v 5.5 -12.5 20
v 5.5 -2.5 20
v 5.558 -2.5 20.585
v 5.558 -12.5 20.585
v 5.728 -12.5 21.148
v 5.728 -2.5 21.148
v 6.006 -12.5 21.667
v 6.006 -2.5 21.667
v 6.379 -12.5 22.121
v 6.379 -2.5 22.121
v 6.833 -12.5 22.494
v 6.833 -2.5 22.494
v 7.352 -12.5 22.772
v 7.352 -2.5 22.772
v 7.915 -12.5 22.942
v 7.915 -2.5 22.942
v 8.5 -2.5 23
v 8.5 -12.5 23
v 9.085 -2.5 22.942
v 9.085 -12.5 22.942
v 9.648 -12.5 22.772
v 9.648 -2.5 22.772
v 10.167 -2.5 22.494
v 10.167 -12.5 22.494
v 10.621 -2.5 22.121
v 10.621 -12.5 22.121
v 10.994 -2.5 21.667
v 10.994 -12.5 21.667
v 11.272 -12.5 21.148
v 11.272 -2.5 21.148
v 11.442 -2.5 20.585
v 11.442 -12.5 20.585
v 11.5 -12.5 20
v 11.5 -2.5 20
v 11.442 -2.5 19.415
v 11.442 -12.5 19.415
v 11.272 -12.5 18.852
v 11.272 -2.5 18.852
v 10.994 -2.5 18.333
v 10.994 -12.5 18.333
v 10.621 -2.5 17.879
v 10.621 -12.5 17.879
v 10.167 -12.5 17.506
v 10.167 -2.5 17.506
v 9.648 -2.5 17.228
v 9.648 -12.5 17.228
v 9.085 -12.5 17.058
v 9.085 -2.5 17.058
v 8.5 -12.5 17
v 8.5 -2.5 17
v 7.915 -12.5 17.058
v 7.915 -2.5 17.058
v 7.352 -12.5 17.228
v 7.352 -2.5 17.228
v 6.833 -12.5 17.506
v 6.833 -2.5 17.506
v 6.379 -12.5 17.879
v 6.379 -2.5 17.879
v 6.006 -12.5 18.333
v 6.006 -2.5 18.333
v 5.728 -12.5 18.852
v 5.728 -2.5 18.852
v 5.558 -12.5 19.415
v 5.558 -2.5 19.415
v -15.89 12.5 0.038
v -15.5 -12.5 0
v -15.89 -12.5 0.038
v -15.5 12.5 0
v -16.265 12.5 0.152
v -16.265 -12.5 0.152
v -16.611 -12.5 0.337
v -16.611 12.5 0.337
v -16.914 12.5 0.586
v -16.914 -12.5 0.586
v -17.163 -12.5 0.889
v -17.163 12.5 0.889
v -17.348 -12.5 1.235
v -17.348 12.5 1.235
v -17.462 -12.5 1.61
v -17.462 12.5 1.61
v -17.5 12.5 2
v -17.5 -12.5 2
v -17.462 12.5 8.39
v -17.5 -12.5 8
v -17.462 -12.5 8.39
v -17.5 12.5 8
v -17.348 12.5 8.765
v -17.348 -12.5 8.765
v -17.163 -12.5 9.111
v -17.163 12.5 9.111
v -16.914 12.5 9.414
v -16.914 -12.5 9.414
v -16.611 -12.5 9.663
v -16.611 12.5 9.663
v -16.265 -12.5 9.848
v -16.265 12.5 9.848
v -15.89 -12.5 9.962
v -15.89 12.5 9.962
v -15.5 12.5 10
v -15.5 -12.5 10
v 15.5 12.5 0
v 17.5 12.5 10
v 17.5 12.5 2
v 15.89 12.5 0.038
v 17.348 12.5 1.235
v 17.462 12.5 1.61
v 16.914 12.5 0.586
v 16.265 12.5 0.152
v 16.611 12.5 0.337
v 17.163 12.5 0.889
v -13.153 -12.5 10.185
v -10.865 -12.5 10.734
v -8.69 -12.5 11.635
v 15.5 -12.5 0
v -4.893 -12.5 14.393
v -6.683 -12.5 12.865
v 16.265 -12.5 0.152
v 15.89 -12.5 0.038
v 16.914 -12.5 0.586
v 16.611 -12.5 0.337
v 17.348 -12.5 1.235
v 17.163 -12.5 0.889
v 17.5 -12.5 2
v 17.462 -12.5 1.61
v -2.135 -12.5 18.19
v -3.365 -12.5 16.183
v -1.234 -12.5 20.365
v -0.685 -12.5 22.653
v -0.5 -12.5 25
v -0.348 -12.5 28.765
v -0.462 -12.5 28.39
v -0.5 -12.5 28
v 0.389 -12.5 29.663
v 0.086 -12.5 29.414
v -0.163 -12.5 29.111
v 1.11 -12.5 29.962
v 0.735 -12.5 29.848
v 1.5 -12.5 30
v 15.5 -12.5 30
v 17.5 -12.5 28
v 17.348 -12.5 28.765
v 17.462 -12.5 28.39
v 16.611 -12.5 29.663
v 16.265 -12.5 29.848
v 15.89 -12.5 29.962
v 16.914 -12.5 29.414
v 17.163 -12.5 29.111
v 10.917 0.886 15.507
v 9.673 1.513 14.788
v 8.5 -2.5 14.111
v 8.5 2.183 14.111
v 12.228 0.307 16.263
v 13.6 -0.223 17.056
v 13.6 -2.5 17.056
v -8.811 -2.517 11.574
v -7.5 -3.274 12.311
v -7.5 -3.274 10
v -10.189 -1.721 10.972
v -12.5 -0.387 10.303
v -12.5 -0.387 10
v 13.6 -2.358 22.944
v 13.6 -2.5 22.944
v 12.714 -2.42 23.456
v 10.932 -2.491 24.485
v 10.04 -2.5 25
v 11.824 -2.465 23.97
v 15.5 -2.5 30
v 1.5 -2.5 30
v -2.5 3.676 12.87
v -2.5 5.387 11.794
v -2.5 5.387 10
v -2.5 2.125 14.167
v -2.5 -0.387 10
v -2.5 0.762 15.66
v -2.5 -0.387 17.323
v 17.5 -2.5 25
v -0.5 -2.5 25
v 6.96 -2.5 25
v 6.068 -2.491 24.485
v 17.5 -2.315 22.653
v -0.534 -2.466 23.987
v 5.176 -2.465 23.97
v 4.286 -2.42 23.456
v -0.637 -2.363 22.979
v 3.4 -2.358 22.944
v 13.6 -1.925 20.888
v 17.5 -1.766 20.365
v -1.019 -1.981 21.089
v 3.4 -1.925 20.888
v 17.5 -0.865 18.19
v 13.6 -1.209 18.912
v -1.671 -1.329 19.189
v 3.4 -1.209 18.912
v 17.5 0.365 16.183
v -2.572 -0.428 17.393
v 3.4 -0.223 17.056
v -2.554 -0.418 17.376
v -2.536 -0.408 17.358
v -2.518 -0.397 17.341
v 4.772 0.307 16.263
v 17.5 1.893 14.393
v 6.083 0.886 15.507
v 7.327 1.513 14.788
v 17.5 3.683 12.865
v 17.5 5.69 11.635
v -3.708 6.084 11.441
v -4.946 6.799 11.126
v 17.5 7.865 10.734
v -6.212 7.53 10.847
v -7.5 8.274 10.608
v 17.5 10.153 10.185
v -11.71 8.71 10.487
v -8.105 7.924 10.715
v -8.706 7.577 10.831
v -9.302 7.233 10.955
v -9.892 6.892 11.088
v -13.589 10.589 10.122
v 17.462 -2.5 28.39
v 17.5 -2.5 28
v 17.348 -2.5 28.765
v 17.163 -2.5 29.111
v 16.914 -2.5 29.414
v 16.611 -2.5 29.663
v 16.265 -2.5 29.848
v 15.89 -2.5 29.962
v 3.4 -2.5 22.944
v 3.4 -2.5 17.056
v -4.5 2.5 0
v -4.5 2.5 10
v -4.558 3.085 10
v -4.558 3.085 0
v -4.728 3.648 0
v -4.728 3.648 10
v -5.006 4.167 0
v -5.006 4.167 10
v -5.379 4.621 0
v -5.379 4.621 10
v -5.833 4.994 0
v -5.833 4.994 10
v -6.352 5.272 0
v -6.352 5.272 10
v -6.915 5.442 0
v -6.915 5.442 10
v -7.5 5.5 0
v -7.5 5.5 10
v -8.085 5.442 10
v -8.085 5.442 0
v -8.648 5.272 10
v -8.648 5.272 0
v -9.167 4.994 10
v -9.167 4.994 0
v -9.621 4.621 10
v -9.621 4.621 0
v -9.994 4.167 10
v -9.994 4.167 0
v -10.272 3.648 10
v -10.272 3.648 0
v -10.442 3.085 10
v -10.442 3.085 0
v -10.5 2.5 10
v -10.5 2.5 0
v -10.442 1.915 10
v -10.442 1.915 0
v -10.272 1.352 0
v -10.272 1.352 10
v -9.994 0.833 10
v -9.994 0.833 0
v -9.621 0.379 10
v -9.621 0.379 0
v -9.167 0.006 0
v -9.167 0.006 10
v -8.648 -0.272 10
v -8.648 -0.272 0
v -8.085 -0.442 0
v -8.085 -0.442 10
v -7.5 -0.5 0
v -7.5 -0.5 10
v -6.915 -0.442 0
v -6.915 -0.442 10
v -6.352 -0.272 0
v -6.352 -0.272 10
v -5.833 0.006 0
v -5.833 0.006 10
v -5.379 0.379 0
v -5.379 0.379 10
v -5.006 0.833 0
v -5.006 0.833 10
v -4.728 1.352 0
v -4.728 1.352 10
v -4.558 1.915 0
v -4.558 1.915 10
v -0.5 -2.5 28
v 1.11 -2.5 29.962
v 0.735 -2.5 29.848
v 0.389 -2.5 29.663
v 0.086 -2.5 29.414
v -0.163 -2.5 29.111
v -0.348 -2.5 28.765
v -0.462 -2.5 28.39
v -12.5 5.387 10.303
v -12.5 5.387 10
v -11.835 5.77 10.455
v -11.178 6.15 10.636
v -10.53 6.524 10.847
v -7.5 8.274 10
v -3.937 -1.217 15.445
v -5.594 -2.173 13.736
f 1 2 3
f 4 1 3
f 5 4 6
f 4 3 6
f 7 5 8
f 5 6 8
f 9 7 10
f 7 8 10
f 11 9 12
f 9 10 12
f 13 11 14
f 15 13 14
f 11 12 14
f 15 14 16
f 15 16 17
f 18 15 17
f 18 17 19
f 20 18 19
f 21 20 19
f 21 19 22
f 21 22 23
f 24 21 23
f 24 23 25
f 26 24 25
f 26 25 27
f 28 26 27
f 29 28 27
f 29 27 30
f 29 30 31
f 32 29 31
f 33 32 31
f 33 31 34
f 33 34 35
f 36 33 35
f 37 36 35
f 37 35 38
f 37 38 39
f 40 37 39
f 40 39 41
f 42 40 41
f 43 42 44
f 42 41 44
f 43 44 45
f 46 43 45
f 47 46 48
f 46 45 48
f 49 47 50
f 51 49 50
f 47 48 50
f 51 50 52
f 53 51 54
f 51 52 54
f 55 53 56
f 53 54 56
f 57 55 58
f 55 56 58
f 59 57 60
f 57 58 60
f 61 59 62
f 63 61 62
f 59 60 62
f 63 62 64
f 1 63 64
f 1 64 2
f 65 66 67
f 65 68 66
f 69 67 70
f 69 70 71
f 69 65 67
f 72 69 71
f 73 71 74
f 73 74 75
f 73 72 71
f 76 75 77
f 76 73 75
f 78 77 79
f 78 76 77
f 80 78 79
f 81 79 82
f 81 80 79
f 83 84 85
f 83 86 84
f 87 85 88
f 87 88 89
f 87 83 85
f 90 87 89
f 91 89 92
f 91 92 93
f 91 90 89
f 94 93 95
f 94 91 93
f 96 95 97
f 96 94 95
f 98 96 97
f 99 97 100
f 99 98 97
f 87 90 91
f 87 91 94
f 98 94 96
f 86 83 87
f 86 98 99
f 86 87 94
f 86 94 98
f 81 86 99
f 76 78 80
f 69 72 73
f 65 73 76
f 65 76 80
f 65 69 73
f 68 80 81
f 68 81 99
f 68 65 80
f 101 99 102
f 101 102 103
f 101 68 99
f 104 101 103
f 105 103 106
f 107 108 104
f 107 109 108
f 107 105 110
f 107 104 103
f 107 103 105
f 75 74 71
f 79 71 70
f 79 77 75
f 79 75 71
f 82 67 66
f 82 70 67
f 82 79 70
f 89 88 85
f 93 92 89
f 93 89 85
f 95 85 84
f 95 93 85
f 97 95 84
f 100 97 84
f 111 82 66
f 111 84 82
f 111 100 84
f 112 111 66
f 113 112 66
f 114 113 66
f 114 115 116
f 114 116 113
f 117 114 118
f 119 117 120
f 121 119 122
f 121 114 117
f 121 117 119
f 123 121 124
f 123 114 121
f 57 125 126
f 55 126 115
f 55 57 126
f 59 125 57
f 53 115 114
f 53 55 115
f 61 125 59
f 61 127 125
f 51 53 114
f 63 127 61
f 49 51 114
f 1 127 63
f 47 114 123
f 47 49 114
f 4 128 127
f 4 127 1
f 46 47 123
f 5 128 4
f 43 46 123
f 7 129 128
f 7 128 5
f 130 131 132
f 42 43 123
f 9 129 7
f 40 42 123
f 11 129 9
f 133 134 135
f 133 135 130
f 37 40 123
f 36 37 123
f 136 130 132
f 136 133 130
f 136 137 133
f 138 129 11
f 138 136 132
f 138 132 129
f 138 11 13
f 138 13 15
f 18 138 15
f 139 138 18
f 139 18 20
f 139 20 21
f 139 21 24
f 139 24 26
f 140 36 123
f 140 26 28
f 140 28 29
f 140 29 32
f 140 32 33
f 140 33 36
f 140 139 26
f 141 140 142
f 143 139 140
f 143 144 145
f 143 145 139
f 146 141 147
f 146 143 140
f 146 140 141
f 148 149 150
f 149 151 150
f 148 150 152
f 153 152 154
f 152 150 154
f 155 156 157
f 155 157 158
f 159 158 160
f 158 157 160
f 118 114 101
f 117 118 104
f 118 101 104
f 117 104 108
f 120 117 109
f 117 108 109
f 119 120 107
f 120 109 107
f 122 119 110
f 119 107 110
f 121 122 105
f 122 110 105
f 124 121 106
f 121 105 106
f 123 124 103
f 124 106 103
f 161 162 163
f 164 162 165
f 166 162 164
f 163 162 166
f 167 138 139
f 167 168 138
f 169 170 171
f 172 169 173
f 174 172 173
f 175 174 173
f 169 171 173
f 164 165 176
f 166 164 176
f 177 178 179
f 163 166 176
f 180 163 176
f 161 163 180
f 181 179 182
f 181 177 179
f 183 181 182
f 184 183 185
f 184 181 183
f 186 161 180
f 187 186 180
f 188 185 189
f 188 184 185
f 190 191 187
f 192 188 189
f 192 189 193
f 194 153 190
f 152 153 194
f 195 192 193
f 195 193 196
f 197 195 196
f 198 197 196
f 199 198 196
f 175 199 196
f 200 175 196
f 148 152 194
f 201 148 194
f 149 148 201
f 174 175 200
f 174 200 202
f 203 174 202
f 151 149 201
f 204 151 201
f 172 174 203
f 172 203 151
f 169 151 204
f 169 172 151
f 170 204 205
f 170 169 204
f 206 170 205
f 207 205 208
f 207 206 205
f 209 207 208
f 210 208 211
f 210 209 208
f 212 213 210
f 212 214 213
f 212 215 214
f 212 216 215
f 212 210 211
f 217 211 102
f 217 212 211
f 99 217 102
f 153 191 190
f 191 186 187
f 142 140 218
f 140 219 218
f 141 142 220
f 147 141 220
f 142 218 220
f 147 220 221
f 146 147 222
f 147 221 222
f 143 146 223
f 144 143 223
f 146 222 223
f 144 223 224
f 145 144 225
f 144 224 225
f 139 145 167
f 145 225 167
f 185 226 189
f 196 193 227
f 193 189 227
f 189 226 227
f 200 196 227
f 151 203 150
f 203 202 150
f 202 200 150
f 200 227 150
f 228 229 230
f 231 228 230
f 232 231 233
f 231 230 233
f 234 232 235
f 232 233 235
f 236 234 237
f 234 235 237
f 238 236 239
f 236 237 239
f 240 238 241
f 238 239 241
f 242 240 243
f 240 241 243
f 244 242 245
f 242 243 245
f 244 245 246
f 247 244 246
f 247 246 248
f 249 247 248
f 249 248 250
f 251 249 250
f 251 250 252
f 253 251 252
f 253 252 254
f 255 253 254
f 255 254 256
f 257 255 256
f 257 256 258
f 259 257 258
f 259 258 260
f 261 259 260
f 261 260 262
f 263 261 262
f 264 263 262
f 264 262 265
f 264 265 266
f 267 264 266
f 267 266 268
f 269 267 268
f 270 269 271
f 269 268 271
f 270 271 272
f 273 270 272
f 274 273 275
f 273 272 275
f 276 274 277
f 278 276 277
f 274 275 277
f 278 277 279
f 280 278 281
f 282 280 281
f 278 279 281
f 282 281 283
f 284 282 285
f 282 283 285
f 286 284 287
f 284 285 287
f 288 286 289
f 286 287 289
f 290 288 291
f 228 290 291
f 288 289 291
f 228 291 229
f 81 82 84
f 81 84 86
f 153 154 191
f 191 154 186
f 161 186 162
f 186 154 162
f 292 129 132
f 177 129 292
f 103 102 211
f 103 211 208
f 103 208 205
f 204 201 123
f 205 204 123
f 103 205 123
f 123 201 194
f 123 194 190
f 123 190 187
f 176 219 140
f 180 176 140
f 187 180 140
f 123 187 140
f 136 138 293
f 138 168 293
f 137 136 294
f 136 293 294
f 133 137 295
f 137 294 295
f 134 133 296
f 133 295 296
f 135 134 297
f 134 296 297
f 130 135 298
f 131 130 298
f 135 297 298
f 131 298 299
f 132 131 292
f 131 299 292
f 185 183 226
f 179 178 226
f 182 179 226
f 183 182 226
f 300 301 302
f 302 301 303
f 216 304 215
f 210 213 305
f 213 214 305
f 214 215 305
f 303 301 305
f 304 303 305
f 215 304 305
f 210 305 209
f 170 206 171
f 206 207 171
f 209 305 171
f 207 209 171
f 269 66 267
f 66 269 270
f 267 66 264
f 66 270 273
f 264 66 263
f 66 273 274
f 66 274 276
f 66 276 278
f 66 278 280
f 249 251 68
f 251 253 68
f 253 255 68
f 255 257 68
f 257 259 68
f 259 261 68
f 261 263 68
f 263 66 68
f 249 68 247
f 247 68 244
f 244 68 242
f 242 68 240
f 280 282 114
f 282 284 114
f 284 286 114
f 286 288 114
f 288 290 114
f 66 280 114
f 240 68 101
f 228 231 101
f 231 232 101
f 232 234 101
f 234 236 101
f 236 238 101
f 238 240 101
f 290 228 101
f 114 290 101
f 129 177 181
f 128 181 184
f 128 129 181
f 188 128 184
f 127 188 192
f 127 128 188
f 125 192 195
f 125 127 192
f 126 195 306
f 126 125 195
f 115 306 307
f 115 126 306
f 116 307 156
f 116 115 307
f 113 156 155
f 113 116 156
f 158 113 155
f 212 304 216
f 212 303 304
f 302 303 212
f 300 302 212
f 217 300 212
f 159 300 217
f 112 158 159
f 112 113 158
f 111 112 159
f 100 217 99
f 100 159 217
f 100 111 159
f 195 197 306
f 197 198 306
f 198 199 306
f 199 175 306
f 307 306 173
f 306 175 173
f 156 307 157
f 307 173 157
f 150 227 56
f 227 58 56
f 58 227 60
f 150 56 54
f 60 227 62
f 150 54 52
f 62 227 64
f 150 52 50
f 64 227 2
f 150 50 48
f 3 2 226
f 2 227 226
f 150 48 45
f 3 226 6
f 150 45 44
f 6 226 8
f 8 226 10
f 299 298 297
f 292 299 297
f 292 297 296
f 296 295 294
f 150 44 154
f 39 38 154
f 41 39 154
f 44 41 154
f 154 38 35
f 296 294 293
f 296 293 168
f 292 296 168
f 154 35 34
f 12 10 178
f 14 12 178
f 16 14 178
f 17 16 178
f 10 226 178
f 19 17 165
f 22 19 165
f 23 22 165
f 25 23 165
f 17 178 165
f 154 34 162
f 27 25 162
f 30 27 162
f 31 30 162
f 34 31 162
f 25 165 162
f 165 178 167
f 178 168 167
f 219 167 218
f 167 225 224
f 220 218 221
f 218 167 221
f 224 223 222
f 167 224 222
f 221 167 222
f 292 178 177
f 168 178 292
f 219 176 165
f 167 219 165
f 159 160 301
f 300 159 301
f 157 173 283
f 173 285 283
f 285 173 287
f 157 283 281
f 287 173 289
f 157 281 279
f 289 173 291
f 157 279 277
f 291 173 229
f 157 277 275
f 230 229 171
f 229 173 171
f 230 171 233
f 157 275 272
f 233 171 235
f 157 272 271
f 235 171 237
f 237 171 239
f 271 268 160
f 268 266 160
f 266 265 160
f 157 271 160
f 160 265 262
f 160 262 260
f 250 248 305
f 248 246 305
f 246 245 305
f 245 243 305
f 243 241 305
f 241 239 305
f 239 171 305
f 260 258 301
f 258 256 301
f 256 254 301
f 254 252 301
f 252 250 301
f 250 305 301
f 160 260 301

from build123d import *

# Parameters (mm, degrees)
SKETCH1_W           = 35
SKETCH1_H           = 25
BOSS_EXTRUDE1_DEPTH = 10
SKETCH2_R           = 3
CUT_EXTRUDE1_DEPTH  = 24.717082451
SKETCH3_W           = 18
SKETCH3_H           = 10
BOSS_EXTRUDE2_DEPTH = 20
SKETCH4_R           = 3
CUT_EXTRUDE2_DEPTH  = 38.831864876
FILLET2_R           = 15
FILLET3_R           = 2
CUT_EXTRUDE3_START  = -10
SKETCH5_R           = 3
CUT_EXTRUDE3_DEPTH  = 27.912057737
CUT_EXTRUDE4_START  = -10
CUT_EXTRUDE4_DEPTH  = 33.793107029


# Some blends are built 0.0001 mm under size
with BuildPart() as part:
    # Sketch1 → Boss-Extrude1 (new body)
    with BuildSketch(Plane.XY):
        Rectangle(SKETCH1_W, SKETCH1_H)
    extrude(amount=BOSS_EXTRUDE1_DEPTH)

    # Sketch2 → Cut-Extrude1 (cut, through all)
    with BuildSketch(Plane.XY.offset(10)):
        with Locations((-7.5, 2.5)):
            Circle(SKETCH2_R)
    extrude(amount=-CUT_EXTRUDE1_DEPTH, mode=Mode.SUBTRACT)

    # Sketch3 → Boss-Extrude2 (add)
    with BuildSketch(Plane.XY.offset(10)):
        with Locations((8.5, -7.5)):
            Rectangle(SKETCH3_W, SKETCH3_H)
    extrude(amount=BOSS_EXTRUDE2_DEPTH)

    # Sketch4 → Cut-Extrude2 (cut, through all)
    with BuildSketch(Plane(origin=(0, -2.5, 0), x_dir=(1, 0, 0), z_dir=(0, 1, 0))):
        with Locations(Location((8.5, -20, 0), (0, 0, 180))):
            Circle(SKETCH4_R)
    extrude(amount=-CUT_EXTRUDE2_DEPTH, mode=Mode.SUBTRACT)

    # Fillet2
    # the kernel refuses this fillet: 15 mm, written as the material it adds along each edge
    with BuildSketch(Plane(origin=(-0.5, -12.5, 10), x_dir=(-1, 0, 0), z_dir=(0, 1, 0))) as fillet2_piece_1:
        with BuildLine():
            CenterArc((FILLET2_R, FILLET2_R), FILLET2_R, 180, 90)
            Line((0, FILLET2_R), (0, 0))
            Line((0, 0), (FILLET2_R, 0))
        make_face()
    extrude(amount=10)
    with BuildSketch(Plane(origin=(-0.5, -2.5, 10), x_dir=(0, 1, 0), z_dir=(1, 0, 0))) as fillet2_piece_2_section:
        with BuildLine():
            CenterArc((FILLET2_R, FILLET2_R), FILLET2_R, 180, 90)
            Line((0, FILLET2_R), (0, 0))
            Line((0, 0), (FILLET2_R, 0))
        make_face()
    fillet2_piece_2 = extrude(amount=18, mode=Mode.PRIVATE)
    fillet2_piece_2 = fillet2_piece_2 - Plane(origin=(8.5, 1.000391612, 20), x_dir=(-1, 0, 0), z_dir=(0, 1, 0)) * Cylinder(3, 96, mode=Mode.PRIVATE)
    add(fillet2_piece_2)
    with BuildSketch(Plane(origin=(-0.5, -12.5, 10), x_dir=(-1, 0, 0), z_dir=(0, 1, 0))) as fillet2_piece_3a_section:
        with BuildLine():
            CenterArc((FILLET2_R, FILLET2_R), FILLET2_R, 180, 90)
            Line((0, FILLET2_R), (0, 0))
            Line((0, 0), (FILLET2_R, 0))
        make_face()
    fillet2_piece_3a = extrude(amount=47.5, mode=Mode.PRIVATE)
    fillet2_piece_3a = split(fillet2_piece_3a, bisect_by=Plane(origin=(-3.591955578, 12.5, 13.608814387), z_dir=(0, -1, 0)), keep=Keep.TOP, mode=Mode.PRIVATE)
    fillet2_piece_3a = fillet2_piece_3a - Plane(origin=(-7.5, 2.5, 13.608814387), x_dir=(1, 0, 0), z_dir=(0, 0, 1)) * Cylinder(3, 155, mode=Mode.PRIVATE)
    fillet2_piece_3a = split(fillet2_piece_3a, bisect_by=Plane(origin=(-3.591955578, -2.5, 13.608814387), z_dir=(0, 1, 0)), keep=Keep.TOP, mode=Mode.PRIVATE)
    with BuildSketch(Plane(origin=(-38, -2.5, 10), x_dir=(0, 1, 0), z_dir=(1, 0, 0))) as fillet2_piece_3b_section:
        with BuildLine():
            CenterArc((FILLET2_R, FILLET2_R), FILLET2_R, 180, 90)
            Line((0, FILLET2_R), (0, 0))
            Line((0, 0), (FILLET2_R, 0))
        make_face()
    fillet2_piece_3b = extrude(amount=55.5, mode=Mode.PRIVATE)
    fillet2_piece_3b = split(fillet2_piece_3b, bisect_by=Plane(origin=(-17.5, 8.593163462, 10.419487544), z_dir=(1, 0, 0)), keep=Keep.TOP, mode=Mode.PRIVATE)
    fillet2_piece_3b = fillet2_piece_3b - Plane(origin=(-7.5, 2.5, 10.419487544), x_dir=(1, 0, 0), z_dir=(0, 0, 1)) * Cylinder(3, 171, mode=Mode.PRIVATE)
    fillet2_piece_3b = split(fillet2_piece_3b, bisect_by=Plane(origin=(-0.5, 8.593163462, 10.419487544), z_dir=(-1, 0, 0)), keep=Keep.TOP, mode=Mode.PRIVATE)
    fillet2_piece_3 = fillet2_piece_3a & fillet2_piece_3b
    add(fillet2_piece_3)

    # Fillet3
    fillet3_edges = [part.edges().sort_by_distance(p)[0] for p in [
        (17.5, 0, 0),
        (-17.5, 0, 0),
        (-17.5, 0, 10),
        (-0.5, -7.5, 30),
        (17.5, -7.5, 30),
    ]]
    fillet(fillet3_edges, radius=FILLET3_R - 0.0001)  # a hair under: the kernel refuses the full size

    # Sketch5 → Cut-Extrude3 (cut, through all)
    with BuildSketch(Plane(origin=(0, 0, 0), x_dir=(-1, 0, 0), z_dir=(0, 0, -1)).offset(CUT_EXTRUDE3_START)):
        Polygon((2.5, 5.386751346), (2.5, -0.386751346), (7.5, -3.273502692), (12.5, -0.386751346), (12.5, 5.386751346), (7.5, 8.273502692), align=None)
        with Locations(Location((7.5, 2.5, 0), (0, 0, 180))):
            Circle(SKETCH5_R, mode=Mode.SUBTRACT)
    extrude(amount=-CUT_EXTRUDE3_DEPTH, mode=Mode.SUBTRACT)

    # Sketch6 → Cut-Extrude4 (cut, through all)
    with BuildSketch(Plane.XZ.offset(12.5).offset(CUT_EXTRUDE4_START)):
        Polygon((8.5, 14.111027254), (13.6, 17.055513627), (13.6, 22.944486373), (8.5, 25.888972746), (3.4, 22.944486373), (3.4, 17.055513627), align=None)
    extrude(amount=-CUT_EXTRUDE4_DEPTH, mode=Mode.SUBTRACT)


solid = part.part
